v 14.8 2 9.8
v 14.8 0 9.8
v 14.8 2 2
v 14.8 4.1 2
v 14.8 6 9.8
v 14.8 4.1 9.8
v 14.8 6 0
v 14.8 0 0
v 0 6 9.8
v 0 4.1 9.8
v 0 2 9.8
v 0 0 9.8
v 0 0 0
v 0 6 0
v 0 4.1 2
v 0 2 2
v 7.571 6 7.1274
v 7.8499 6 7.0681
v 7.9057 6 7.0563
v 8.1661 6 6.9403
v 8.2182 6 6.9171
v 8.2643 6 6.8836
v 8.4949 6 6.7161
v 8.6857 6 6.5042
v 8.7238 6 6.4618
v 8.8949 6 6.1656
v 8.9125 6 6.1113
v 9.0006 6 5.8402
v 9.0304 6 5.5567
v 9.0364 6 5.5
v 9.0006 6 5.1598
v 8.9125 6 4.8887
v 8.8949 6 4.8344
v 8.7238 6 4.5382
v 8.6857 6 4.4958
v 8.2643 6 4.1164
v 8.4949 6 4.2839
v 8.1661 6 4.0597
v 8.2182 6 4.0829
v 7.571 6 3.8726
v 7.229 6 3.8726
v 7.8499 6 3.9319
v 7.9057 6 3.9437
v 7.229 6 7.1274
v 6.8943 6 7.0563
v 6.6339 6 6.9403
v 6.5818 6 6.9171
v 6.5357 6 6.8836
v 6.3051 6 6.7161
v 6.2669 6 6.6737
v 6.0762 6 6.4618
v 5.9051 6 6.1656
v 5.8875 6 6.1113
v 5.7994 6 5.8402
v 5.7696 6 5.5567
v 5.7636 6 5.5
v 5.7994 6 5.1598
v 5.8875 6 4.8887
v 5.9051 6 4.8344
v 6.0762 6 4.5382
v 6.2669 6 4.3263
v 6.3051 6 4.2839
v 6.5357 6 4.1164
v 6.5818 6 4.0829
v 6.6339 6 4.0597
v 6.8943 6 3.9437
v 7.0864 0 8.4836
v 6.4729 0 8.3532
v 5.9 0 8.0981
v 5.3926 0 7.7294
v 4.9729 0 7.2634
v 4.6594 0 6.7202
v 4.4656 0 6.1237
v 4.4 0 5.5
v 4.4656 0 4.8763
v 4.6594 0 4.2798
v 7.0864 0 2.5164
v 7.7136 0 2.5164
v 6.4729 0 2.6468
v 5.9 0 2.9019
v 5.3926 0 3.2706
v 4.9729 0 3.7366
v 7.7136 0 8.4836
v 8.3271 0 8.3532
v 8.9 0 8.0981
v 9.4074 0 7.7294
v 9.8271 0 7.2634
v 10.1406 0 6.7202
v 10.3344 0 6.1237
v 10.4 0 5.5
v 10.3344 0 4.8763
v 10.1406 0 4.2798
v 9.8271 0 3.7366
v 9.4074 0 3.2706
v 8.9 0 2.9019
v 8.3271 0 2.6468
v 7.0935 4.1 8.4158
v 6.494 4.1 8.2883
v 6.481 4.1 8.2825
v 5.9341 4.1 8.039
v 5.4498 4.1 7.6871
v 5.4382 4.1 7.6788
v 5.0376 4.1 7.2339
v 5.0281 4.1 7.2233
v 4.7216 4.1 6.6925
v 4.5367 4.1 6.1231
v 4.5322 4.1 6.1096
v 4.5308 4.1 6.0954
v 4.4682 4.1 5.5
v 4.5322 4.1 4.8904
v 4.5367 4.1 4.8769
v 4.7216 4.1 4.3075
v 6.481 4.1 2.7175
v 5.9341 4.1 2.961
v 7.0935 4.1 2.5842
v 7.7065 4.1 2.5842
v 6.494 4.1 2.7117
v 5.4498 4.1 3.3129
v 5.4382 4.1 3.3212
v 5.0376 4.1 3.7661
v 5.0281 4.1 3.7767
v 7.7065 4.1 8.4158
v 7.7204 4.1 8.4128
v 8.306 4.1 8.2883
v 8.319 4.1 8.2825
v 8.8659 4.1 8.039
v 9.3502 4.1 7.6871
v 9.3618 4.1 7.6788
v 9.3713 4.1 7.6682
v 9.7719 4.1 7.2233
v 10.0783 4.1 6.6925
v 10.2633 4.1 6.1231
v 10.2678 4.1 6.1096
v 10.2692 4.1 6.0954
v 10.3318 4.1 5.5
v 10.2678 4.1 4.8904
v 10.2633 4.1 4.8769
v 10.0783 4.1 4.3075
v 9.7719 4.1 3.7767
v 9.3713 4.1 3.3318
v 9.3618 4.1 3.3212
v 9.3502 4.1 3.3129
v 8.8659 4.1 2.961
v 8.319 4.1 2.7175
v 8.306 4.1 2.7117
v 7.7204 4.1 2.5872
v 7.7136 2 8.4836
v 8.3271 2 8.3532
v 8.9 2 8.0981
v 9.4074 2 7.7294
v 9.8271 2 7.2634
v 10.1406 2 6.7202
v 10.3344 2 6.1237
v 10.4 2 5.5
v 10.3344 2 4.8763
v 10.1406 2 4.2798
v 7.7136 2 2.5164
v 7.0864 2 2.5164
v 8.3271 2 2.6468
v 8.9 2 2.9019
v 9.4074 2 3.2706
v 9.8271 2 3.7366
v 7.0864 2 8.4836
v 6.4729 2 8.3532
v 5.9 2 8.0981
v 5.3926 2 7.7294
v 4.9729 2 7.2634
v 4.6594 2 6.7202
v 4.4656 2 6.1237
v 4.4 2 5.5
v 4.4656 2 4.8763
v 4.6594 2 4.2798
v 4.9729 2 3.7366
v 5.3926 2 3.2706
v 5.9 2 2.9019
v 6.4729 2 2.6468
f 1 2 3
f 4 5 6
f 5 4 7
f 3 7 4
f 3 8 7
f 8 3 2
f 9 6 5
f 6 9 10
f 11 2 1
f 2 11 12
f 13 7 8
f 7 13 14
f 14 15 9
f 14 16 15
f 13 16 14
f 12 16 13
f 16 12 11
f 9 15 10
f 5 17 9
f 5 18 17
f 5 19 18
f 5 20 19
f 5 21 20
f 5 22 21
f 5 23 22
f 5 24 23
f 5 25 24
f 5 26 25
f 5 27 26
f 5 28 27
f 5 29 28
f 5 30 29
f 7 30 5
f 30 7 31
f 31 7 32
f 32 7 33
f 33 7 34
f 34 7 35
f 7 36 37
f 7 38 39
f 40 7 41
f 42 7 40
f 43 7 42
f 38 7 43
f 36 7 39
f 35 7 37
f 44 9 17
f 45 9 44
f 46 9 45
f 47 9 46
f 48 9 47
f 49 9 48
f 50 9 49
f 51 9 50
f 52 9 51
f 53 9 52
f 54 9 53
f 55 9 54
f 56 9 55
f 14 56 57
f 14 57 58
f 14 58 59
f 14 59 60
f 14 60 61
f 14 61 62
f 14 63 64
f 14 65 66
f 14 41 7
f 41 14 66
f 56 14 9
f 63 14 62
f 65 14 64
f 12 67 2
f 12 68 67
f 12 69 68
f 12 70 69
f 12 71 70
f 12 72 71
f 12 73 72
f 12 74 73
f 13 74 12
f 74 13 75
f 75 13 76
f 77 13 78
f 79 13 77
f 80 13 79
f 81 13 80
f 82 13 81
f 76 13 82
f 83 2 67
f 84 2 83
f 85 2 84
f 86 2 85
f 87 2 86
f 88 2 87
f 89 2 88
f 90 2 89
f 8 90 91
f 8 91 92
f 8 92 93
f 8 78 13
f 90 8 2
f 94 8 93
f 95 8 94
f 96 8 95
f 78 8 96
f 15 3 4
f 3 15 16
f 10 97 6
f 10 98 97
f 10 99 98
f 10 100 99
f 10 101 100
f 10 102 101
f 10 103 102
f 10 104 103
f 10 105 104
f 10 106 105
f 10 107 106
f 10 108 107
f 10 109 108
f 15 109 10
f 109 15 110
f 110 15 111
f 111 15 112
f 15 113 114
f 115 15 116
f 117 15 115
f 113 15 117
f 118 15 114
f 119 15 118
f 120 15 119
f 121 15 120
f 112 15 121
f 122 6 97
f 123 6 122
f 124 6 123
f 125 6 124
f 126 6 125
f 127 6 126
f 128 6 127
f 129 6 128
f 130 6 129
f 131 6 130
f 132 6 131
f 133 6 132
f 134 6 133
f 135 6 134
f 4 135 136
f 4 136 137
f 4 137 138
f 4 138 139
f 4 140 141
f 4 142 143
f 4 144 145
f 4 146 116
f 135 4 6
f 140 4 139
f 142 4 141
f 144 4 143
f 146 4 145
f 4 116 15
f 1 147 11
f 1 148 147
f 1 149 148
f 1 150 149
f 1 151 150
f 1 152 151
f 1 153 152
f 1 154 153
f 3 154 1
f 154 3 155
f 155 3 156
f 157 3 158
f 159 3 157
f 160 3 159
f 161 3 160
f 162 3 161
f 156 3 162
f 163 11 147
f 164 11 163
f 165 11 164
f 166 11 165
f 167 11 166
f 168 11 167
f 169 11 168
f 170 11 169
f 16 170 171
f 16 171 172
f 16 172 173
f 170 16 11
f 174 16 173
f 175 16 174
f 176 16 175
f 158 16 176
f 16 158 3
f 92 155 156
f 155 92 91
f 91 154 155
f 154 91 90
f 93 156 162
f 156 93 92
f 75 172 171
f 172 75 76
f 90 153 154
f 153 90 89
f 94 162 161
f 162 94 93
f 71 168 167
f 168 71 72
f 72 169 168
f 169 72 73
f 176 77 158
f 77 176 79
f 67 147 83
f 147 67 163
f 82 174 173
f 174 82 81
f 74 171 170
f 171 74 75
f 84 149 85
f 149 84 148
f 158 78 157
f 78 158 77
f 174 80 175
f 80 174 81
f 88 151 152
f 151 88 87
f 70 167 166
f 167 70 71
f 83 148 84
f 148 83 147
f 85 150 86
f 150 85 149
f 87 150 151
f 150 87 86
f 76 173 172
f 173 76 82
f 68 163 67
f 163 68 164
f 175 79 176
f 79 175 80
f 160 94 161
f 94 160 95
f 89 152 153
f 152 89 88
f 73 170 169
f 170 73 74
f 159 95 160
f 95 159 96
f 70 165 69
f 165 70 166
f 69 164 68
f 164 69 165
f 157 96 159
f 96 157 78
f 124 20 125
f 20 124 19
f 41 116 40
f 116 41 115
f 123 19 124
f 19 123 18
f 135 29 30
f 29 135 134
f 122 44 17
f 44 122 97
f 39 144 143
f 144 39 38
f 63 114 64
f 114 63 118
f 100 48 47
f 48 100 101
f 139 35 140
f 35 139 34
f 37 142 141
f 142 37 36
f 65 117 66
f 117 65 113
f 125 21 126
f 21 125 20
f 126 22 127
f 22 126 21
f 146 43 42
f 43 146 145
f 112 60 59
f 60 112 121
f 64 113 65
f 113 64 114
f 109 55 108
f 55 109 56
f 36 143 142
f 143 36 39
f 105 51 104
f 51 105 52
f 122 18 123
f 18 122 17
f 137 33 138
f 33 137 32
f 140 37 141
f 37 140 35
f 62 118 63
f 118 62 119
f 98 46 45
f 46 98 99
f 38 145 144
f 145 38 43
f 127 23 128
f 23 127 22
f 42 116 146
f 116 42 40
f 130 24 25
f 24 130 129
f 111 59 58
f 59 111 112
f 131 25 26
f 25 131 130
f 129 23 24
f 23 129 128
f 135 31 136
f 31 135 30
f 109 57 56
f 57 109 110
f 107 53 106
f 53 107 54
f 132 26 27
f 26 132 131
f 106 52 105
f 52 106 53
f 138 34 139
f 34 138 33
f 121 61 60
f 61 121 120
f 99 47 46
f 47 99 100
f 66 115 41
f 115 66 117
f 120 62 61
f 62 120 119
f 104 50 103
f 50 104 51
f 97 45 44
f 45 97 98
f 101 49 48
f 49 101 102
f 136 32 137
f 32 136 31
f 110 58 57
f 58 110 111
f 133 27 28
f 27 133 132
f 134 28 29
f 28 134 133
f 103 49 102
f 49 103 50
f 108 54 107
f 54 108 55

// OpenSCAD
difference() {
    cube([14.8, 6, 9.8]);

    translate([-0.1, 2, 2])
    cube([15, 2.1, 9]);
    
    translate([7.4, -1, 5.5]) 
    rotate([-90, 0, 0])
    cylinder(4, d=6, $fn=30);
    
    translate([7.4, 4, 5.5]) 
    rotate([-90, 0, 0])
    cylinder(2.2, d1=6, d2=3, $fn=30);
}
